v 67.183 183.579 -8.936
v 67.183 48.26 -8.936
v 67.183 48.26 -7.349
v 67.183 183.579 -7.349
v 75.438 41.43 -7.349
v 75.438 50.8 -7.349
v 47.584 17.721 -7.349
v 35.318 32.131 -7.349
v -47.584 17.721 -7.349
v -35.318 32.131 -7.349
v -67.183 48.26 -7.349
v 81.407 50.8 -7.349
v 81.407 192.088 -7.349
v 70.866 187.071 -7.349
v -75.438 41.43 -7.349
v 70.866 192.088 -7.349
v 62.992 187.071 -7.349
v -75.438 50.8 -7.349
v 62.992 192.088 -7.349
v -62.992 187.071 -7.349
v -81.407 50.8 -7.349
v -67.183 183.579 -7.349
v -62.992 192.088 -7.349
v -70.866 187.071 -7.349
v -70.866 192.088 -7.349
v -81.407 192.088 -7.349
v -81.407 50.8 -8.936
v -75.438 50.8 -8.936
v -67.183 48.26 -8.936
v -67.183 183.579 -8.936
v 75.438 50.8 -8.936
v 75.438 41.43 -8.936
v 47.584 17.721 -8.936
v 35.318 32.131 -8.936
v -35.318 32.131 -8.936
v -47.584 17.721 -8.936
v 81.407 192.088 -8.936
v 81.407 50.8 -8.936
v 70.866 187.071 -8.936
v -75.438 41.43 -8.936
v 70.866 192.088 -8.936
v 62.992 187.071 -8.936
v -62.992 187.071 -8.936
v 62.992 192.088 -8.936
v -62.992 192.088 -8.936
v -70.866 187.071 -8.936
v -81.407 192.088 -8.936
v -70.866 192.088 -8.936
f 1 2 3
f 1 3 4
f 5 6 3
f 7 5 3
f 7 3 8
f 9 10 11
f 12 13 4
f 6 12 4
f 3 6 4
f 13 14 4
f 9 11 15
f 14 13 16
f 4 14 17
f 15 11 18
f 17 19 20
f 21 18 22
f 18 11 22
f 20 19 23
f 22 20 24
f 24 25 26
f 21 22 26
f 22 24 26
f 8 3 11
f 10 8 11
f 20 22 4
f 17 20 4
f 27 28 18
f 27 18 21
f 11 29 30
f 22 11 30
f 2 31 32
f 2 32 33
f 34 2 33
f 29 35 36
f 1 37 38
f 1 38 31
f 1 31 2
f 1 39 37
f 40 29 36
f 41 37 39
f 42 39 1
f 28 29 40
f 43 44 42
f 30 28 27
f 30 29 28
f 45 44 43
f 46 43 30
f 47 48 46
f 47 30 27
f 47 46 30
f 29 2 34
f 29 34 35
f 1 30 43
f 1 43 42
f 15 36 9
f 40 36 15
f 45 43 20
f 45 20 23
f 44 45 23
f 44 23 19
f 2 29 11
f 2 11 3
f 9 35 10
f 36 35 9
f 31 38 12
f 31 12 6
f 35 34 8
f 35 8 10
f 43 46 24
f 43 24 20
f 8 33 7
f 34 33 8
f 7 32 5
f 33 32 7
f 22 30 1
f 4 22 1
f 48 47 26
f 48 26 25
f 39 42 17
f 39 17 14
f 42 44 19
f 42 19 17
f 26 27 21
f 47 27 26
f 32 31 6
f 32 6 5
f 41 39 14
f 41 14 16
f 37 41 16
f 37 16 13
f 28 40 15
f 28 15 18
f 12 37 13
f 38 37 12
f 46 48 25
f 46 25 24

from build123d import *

# Parameters (mm, degrees)
SKETCH1_W           = 134.366
SKETCH1_H           = 135.318500012
BOSS_EXTRUDE1_DEPTH = 1.5875


with BuildPart() as part:
    # Sketch1 → Boss-Extrude1 (new body)
    with BuildSketch(Plane.XY.offset(-8.9364)):
        Polygon((-62.992, 192.0875), (62.992, 192.0875), (62.992, 187.071), (70.866, 187.071), (70.866, 192.0875), (81.407, 192.0875), (81.407, 50.8), (75.438, 50.8), (75.438, 41.429545859), (47.584469242, 17.720620478), (35.318354193, 32.131), (-35.318354193, 32.131), (-47.584469242, 17.720620478), (-75.438, 41.429545859), (-75.438, 50.8), (-81.407, 50.8), (-81.407, 192.0875), (-70.866, 192.0875), (-70.866, 187.071), (-62.992, 187.071), align=None)
        with Locations((0, 115.919250006)):
            Rectangle(SKETCH1_W, SKETCH1_H, mode=Mode.SUBTRACT)
    extrude(amount=BOSS_EXTRUDE1_DEPTH)


solid = part.part
